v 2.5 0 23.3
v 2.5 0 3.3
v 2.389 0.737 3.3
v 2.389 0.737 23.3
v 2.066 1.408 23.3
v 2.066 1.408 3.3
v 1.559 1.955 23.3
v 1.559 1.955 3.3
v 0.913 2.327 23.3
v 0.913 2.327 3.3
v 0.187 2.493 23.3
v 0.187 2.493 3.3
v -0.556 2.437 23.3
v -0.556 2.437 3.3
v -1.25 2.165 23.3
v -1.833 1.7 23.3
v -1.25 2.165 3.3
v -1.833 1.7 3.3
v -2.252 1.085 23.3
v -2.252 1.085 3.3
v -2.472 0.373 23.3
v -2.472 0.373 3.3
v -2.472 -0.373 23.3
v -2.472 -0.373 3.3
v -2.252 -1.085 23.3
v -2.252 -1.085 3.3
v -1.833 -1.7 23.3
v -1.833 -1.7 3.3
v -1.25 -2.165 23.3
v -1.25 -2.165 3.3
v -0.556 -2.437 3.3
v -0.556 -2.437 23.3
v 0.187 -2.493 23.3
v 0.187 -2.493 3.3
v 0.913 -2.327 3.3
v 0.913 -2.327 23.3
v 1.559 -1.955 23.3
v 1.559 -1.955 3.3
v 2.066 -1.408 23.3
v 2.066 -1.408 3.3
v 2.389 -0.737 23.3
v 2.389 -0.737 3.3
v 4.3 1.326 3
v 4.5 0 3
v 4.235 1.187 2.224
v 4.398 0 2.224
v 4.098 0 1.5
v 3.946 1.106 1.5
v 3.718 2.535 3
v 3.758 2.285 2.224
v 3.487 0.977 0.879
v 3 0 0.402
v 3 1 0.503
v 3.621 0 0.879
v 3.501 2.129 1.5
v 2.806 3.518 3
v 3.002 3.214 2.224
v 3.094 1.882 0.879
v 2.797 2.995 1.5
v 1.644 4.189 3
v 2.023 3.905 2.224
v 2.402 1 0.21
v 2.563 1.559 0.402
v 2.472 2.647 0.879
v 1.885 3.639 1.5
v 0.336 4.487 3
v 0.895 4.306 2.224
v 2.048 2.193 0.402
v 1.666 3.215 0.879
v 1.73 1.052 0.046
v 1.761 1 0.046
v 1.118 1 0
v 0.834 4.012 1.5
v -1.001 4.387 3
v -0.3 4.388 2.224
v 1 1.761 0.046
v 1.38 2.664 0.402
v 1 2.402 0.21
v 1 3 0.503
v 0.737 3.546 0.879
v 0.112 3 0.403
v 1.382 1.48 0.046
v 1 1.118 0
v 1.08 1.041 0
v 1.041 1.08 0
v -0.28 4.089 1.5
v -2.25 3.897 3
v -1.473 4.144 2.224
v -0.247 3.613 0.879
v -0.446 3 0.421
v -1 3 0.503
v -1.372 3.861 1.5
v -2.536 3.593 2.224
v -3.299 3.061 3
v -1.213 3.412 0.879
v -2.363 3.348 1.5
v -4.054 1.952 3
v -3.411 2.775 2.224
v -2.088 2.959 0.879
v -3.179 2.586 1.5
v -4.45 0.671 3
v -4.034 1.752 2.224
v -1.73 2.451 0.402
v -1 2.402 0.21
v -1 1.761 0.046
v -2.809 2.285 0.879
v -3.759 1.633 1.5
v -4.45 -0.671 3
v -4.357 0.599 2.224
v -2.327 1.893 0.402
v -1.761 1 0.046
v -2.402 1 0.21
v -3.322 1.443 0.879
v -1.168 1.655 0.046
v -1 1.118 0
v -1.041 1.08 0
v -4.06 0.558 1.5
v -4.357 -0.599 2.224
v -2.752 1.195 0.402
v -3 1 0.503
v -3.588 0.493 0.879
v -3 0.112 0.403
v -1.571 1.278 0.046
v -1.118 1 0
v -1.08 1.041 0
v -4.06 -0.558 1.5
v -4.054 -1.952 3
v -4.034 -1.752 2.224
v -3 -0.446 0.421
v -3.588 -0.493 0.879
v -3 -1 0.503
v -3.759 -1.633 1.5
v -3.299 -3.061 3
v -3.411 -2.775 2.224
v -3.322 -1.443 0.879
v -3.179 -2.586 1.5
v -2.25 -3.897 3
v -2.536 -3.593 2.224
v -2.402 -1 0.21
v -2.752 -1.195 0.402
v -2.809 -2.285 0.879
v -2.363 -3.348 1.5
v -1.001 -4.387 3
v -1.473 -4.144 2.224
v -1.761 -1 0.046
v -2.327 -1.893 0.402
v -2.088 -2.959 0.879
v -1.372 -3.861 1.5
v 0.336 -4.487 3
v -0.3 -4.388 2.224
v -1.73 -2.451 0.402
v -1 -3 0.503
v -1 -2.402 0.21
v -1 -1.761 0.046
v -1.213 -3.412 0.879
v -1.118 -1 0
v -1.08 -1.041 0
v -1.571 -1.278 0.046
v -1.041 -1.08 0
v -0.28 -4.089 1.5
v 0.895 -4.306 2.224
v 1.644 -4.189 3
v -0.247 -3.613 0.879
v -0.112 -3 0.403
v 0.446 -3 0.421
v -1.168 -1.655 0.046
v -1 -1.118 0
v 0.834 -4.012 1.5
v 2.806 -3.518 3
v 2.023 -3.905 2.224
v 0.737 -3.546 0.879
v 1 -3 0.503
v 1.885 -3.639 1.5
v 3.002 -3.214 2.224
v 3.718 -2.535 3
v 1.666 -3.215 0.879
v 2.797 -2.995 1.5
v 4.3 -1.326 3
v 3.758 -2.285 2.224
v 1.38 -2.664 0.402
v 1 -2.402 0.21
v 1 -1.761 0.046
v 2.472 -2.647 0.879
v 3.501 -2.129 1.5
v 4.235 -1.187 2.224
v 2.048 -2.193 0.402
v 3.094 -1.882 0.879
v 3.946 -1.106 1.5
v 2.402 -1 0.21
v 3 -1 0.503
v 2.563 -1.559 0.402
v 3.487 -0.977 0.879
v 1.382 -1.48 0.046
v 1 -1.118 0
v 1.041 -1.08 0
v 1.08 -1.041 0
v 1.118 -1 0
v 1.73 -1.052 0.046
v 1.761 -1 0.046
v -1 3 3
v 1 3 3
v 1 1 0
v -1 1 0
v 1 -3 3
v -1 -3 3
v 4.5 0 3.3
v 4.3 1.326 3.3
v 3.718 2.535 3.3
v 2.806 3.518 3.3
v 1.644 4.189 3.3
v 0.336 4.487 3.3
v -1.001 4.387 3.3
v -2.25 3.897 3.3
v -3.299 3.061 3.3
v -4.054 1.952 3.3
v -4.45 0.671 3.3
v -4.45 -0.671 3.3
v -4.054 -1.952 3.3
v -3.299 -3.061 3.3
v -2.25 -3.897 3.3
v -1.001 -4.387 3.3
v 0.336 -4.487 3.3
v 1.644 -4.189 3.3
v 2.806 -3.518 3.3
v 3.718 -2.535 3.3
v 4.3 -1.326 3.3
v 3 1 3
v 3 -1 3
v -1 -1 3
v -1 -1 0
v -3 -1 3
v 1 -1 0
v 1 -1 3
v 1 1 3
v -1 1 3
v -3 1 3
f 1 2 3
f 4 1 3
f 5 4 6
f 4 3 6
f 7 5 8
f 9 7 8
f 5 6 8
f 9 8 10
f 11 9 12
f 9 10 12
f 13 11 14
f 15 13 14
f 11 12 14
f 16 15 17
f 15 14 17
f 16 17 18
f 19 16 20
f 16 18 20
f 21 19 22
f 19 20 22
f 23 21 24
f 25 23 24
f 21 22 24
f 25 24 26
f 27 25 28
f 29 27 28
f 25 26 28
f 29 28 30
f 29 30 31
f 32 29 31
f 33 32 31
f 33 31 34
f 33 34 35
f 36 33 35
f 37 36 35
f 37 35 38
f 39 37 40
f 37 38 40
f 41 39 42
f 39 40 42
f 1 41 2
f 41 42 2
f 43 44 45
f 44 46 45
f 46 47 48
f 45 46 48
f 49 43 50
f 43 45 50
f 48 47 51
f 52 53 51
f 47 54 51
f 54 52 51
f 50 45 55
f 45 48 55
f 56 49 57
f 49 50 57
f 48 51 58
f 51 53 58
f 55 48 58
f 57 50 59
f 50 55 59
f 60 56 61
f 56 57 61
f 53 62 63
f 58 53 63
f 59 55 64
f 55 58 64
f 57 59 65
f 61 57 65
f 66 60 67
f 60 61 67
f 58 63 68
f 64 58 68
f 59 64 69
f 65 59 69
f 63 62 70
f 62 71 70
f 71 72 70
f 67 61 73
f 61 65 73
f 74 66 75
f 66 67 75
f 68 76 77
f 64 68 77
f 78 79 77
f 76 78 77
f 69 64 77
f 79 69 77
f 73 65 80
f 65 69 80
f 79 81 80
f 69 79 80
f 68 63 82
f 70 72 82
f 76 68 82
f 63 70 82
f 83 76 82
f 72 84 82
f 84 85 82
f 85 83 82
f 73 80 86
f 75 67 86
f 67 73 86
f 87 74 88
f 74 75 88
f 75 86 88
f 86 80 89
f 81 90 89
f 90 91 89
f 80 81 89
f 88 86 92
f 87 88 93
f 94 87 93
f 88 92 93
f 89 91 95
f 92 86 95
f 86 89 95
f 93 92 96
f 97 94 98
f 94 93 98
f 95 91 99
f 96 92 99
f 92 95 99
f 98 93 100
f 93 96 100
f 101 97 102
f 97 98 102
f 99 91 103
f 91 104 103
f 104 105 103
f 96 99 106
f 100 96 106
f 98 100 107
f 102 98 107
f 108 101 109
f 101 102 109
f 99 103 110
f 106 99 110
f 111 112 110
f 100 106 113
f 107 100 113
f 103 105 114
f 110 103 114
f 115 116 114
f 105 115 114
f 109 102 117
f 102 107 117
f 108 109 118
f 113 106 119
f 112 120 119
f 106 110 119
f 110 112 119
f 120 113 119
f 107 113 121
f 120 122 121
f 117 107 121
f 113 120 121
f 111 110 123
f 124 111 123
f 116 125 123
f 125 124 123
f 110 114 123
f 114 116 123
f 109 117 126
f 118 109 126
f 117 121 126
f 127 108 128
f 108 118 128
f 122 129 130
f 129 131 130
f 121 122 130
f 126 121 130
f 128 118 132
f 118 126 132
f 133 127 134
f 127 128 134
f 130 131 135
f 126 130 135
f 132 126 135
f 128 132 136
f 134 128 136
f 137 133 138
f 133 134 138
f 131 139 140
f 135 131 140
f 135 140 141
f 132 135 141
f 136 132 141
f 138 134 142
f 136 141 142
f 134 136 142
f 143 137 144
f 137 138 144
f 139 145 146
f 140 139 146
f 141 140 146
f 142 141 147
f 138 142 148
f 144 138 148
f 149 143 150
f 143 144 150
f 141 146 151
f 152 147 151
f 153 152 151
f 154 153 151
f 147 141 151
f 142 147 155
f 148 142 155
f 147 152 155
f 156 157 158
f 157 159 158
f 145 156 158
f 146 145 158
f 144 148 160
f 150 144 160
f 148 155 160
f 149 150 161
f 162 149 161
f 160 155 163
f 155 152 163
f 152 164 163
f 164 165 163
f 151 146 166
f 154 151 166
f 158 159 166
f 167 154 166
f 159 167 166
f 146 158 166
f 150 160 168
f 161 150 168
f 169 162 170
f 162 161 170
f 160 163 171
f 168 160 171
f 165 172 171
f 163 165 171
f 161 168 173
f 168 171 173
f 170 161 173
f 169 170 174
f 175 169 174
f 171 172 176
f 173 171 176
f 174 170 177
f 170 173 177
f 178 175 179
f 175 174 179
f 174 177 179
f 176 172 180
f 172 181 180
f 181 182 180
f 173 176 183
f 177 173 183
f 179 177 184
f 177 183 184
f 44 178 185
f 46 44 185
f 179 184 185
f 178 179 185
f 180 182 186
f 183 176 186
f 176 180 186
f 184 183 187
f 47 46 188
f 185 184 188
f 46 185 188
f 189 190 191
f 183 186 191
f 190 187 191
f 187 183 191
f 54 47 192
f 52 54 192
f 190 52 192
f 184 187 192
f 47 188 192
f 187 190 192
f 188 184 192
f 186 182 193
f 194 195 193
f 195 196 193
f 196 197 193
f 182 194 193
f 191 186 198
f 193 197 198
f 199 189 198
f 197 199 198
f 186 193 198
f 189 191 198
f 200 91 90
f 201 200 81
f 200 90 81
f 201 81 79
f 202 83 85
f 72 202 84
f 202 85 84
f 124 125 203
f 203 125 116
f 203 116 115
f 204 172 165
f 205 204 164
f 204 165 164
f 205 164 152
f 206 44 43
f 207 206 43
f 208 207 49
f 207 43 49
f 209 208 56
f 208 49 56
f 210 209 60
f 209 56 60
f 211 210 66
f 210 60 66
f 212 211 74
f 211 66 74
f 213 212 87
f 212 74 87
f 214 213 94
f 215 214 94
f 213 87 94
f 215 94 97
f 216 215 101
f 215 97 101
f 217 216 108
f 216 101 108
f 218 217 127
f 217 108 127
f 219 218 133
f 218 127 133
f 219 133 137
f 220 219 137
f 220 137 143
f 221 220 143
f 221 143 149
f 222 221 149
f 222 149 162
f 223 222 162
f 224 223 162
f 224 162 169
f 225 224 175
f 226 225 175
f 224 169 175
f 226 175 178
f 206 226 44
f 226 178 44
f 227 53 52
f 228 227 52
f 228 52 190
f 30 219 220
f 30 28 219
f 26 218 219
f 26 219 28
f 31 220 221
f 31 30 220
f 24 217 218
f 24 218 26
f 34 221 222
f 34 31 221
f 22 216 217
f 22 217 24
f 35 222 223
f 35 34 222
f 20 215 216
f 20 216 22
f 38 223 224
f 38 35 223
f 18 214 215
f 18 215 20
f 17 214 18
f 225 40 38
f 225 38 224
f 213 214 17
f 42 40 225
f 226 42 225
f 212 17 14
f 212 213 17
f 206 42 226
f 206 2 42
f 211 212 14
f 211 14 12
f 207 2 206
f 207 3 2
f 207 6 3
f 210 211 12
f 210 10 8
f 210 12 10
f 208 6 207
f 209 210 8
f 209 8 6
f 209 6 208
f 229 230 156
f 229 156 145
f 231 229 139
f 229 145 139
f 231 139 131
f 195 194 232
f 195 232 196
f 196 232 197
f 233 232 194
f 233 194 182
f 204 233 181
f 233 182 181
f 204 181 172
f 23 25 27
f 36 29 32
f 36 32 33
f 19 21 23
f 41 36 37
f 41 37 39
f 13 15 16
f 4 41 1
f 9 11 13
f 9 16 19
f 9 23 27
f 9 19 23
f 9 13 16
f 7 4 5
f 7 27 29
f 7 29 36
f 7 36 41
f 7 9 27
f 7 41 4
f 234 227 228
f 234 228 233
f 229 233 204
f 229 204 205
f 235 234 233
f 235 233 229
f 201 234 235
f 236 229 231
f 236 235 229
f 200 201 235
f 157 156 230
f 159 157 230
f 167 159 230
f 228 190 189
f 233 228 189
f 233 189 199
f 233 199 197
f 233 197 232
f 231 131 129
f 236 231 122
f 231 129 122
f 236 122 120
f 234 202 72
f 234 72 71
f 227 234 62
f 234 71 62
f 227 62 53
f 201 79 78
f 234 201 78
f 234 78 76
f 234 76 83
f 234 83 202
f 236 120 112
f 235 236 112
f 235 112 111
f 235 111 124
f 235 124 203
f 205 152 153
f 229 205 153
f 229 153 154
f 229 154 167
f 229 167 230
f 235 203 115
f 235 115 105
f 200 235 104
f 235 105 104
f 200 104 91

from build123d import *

# Parameters (mm, degrees)
SKETCH_1_R          = 4.5
EXTRUDE_1_DEPTH     = 3.3
SKETCH_2_R          = 2.5
EXTRUDE_2_DEPTH     = 20
FILLET_2_R          = 3
SKETCH_3_W          = 2
SKETCH_3_H          = 2
CUT_EXTRUDE_1_DEPTH = 3


with BuildPart() as part:
    # ｽｹｯﾁ1 → ﾎﾞｽ - 押し出し1 (new body)
    with BuildSketch(Plane.XY):
        Circle(SKETCH_1_R)
    extrude(amount=EXTRUDE_1_DEPTH)

    # ｽｹｯﾁ2 → ﾎﾞｽ - 押し出し2 (add)
    with BuildSketch(Plane.XY.offset(3.3)):
        Circle(SKETCH_2_R)
    extrude(amount=EXTRUDE_2_DEPTH)

    # ﾌｨﾚｯﾄ2
    fillet_2_edges = [part.edges().sort_by_distance(p)[0] for p in [
        (-4.5, 0, 0),
    ]]
    fillet(fillet_2_edges, radius=FILLET_2_R)

    # ｽｹｯﾁ3 → ｶｯﾄ - 押し出し1 (cut)
    with BuildSketch(Plane(origin=(0, 0, 0), x_dir=(-1, 0, 0), z_dir=(0, 0, -1))):
        with BuildLine():
            Line((-1, 3), (-1, 1.118033989))
            ThreePointArc((-1, 1.118033989), (0, 1.5), (1, 1.118033989))
            Line((1, 1.118033989), (1, 3))
            Line((1, 3), (-1, 3))
        make_face()
        Rectangle(SKETCH_3_W, SKETCH_3_H)
        with BuildLine():
            ThreePointArc((1.5, 0), (1.401258538, -0.535233135), (1.118033989, -1))
            Line((1.118033989, -1), (3, -1))
            Line((3, -1), (3, 1))
            Line((3, 1), (1.118033989, 1))
            ThreePointArc((1.118033989, 1), (1.401258538, 0.535233135), (1.5, 0))
        make_face()
        with BuildLine():
            Line((1, 1), (1, -1))
            Line((1, -1), (1.118033989, -1))
            ThreePointArc((1.118033989, -1), (1.401258538, -0.535233135), (1.5, 0))
            ThreePointArc((1.5, 0), (1.401258538, 0.535233135), (1.118033989, 1))
            Line((1.118033989, 1), (1, 1))
        make_face()
        with BuildLine():
            ThreePointArc((-1.118033989, 1), (-1.5, 0), (-1.118033989, -1))
            Line((-1.118033989, -1), (-1, -1))
            Line((-1, -1), (-1, 1))
            Line((-1, 1), (-1.118033989, 1))
        make_face()
        with BuildLine():
            Line((-3, 1), (-3, -1))
            Line((-3, -1), (-1.118033989, -1))
            ThreePointArc((-1.118033989, -1), (-1.5, 0), (-1.118033989, 1))
            Line((-1.118033989, 1), (-3, 1))
        make_face()
        with BuildLine():
            Line((1, -1), (-1, -1))
            Line((-1, -1), (-1, -1.118033989))
            ThreePointArc((-1, -1.118033989), (0, -1.5), (1, -1.118033989))
            Line((1, -1.118033989), (1, -1))
        make_face()
        with BuildLine():
            ThreePointArc((1, -1.118033989), (0, -1.5), (-1, -1.118033989))
            Line((-1, -1.118033989), (-1, -3))
            Line((-1, -3), (1, -3))
            Line((1, -3), (1, -1.118033989))
        make_face()
        with BuildLine():
            Line((-1, 1.118033989), (-1, 1))
            Line((-1, 1), (1, 1))
            Line((1, 1), (1, 1.118033989))
            ThreePointArc((1, 1.118033989), (0, 1.5), (-1, 1.118033989))
        make_face()
    extrude(amount=-CUT_EXTRUDE_1_DEPTH, mode=Mode.SUBTRACT)


solid = part.part
